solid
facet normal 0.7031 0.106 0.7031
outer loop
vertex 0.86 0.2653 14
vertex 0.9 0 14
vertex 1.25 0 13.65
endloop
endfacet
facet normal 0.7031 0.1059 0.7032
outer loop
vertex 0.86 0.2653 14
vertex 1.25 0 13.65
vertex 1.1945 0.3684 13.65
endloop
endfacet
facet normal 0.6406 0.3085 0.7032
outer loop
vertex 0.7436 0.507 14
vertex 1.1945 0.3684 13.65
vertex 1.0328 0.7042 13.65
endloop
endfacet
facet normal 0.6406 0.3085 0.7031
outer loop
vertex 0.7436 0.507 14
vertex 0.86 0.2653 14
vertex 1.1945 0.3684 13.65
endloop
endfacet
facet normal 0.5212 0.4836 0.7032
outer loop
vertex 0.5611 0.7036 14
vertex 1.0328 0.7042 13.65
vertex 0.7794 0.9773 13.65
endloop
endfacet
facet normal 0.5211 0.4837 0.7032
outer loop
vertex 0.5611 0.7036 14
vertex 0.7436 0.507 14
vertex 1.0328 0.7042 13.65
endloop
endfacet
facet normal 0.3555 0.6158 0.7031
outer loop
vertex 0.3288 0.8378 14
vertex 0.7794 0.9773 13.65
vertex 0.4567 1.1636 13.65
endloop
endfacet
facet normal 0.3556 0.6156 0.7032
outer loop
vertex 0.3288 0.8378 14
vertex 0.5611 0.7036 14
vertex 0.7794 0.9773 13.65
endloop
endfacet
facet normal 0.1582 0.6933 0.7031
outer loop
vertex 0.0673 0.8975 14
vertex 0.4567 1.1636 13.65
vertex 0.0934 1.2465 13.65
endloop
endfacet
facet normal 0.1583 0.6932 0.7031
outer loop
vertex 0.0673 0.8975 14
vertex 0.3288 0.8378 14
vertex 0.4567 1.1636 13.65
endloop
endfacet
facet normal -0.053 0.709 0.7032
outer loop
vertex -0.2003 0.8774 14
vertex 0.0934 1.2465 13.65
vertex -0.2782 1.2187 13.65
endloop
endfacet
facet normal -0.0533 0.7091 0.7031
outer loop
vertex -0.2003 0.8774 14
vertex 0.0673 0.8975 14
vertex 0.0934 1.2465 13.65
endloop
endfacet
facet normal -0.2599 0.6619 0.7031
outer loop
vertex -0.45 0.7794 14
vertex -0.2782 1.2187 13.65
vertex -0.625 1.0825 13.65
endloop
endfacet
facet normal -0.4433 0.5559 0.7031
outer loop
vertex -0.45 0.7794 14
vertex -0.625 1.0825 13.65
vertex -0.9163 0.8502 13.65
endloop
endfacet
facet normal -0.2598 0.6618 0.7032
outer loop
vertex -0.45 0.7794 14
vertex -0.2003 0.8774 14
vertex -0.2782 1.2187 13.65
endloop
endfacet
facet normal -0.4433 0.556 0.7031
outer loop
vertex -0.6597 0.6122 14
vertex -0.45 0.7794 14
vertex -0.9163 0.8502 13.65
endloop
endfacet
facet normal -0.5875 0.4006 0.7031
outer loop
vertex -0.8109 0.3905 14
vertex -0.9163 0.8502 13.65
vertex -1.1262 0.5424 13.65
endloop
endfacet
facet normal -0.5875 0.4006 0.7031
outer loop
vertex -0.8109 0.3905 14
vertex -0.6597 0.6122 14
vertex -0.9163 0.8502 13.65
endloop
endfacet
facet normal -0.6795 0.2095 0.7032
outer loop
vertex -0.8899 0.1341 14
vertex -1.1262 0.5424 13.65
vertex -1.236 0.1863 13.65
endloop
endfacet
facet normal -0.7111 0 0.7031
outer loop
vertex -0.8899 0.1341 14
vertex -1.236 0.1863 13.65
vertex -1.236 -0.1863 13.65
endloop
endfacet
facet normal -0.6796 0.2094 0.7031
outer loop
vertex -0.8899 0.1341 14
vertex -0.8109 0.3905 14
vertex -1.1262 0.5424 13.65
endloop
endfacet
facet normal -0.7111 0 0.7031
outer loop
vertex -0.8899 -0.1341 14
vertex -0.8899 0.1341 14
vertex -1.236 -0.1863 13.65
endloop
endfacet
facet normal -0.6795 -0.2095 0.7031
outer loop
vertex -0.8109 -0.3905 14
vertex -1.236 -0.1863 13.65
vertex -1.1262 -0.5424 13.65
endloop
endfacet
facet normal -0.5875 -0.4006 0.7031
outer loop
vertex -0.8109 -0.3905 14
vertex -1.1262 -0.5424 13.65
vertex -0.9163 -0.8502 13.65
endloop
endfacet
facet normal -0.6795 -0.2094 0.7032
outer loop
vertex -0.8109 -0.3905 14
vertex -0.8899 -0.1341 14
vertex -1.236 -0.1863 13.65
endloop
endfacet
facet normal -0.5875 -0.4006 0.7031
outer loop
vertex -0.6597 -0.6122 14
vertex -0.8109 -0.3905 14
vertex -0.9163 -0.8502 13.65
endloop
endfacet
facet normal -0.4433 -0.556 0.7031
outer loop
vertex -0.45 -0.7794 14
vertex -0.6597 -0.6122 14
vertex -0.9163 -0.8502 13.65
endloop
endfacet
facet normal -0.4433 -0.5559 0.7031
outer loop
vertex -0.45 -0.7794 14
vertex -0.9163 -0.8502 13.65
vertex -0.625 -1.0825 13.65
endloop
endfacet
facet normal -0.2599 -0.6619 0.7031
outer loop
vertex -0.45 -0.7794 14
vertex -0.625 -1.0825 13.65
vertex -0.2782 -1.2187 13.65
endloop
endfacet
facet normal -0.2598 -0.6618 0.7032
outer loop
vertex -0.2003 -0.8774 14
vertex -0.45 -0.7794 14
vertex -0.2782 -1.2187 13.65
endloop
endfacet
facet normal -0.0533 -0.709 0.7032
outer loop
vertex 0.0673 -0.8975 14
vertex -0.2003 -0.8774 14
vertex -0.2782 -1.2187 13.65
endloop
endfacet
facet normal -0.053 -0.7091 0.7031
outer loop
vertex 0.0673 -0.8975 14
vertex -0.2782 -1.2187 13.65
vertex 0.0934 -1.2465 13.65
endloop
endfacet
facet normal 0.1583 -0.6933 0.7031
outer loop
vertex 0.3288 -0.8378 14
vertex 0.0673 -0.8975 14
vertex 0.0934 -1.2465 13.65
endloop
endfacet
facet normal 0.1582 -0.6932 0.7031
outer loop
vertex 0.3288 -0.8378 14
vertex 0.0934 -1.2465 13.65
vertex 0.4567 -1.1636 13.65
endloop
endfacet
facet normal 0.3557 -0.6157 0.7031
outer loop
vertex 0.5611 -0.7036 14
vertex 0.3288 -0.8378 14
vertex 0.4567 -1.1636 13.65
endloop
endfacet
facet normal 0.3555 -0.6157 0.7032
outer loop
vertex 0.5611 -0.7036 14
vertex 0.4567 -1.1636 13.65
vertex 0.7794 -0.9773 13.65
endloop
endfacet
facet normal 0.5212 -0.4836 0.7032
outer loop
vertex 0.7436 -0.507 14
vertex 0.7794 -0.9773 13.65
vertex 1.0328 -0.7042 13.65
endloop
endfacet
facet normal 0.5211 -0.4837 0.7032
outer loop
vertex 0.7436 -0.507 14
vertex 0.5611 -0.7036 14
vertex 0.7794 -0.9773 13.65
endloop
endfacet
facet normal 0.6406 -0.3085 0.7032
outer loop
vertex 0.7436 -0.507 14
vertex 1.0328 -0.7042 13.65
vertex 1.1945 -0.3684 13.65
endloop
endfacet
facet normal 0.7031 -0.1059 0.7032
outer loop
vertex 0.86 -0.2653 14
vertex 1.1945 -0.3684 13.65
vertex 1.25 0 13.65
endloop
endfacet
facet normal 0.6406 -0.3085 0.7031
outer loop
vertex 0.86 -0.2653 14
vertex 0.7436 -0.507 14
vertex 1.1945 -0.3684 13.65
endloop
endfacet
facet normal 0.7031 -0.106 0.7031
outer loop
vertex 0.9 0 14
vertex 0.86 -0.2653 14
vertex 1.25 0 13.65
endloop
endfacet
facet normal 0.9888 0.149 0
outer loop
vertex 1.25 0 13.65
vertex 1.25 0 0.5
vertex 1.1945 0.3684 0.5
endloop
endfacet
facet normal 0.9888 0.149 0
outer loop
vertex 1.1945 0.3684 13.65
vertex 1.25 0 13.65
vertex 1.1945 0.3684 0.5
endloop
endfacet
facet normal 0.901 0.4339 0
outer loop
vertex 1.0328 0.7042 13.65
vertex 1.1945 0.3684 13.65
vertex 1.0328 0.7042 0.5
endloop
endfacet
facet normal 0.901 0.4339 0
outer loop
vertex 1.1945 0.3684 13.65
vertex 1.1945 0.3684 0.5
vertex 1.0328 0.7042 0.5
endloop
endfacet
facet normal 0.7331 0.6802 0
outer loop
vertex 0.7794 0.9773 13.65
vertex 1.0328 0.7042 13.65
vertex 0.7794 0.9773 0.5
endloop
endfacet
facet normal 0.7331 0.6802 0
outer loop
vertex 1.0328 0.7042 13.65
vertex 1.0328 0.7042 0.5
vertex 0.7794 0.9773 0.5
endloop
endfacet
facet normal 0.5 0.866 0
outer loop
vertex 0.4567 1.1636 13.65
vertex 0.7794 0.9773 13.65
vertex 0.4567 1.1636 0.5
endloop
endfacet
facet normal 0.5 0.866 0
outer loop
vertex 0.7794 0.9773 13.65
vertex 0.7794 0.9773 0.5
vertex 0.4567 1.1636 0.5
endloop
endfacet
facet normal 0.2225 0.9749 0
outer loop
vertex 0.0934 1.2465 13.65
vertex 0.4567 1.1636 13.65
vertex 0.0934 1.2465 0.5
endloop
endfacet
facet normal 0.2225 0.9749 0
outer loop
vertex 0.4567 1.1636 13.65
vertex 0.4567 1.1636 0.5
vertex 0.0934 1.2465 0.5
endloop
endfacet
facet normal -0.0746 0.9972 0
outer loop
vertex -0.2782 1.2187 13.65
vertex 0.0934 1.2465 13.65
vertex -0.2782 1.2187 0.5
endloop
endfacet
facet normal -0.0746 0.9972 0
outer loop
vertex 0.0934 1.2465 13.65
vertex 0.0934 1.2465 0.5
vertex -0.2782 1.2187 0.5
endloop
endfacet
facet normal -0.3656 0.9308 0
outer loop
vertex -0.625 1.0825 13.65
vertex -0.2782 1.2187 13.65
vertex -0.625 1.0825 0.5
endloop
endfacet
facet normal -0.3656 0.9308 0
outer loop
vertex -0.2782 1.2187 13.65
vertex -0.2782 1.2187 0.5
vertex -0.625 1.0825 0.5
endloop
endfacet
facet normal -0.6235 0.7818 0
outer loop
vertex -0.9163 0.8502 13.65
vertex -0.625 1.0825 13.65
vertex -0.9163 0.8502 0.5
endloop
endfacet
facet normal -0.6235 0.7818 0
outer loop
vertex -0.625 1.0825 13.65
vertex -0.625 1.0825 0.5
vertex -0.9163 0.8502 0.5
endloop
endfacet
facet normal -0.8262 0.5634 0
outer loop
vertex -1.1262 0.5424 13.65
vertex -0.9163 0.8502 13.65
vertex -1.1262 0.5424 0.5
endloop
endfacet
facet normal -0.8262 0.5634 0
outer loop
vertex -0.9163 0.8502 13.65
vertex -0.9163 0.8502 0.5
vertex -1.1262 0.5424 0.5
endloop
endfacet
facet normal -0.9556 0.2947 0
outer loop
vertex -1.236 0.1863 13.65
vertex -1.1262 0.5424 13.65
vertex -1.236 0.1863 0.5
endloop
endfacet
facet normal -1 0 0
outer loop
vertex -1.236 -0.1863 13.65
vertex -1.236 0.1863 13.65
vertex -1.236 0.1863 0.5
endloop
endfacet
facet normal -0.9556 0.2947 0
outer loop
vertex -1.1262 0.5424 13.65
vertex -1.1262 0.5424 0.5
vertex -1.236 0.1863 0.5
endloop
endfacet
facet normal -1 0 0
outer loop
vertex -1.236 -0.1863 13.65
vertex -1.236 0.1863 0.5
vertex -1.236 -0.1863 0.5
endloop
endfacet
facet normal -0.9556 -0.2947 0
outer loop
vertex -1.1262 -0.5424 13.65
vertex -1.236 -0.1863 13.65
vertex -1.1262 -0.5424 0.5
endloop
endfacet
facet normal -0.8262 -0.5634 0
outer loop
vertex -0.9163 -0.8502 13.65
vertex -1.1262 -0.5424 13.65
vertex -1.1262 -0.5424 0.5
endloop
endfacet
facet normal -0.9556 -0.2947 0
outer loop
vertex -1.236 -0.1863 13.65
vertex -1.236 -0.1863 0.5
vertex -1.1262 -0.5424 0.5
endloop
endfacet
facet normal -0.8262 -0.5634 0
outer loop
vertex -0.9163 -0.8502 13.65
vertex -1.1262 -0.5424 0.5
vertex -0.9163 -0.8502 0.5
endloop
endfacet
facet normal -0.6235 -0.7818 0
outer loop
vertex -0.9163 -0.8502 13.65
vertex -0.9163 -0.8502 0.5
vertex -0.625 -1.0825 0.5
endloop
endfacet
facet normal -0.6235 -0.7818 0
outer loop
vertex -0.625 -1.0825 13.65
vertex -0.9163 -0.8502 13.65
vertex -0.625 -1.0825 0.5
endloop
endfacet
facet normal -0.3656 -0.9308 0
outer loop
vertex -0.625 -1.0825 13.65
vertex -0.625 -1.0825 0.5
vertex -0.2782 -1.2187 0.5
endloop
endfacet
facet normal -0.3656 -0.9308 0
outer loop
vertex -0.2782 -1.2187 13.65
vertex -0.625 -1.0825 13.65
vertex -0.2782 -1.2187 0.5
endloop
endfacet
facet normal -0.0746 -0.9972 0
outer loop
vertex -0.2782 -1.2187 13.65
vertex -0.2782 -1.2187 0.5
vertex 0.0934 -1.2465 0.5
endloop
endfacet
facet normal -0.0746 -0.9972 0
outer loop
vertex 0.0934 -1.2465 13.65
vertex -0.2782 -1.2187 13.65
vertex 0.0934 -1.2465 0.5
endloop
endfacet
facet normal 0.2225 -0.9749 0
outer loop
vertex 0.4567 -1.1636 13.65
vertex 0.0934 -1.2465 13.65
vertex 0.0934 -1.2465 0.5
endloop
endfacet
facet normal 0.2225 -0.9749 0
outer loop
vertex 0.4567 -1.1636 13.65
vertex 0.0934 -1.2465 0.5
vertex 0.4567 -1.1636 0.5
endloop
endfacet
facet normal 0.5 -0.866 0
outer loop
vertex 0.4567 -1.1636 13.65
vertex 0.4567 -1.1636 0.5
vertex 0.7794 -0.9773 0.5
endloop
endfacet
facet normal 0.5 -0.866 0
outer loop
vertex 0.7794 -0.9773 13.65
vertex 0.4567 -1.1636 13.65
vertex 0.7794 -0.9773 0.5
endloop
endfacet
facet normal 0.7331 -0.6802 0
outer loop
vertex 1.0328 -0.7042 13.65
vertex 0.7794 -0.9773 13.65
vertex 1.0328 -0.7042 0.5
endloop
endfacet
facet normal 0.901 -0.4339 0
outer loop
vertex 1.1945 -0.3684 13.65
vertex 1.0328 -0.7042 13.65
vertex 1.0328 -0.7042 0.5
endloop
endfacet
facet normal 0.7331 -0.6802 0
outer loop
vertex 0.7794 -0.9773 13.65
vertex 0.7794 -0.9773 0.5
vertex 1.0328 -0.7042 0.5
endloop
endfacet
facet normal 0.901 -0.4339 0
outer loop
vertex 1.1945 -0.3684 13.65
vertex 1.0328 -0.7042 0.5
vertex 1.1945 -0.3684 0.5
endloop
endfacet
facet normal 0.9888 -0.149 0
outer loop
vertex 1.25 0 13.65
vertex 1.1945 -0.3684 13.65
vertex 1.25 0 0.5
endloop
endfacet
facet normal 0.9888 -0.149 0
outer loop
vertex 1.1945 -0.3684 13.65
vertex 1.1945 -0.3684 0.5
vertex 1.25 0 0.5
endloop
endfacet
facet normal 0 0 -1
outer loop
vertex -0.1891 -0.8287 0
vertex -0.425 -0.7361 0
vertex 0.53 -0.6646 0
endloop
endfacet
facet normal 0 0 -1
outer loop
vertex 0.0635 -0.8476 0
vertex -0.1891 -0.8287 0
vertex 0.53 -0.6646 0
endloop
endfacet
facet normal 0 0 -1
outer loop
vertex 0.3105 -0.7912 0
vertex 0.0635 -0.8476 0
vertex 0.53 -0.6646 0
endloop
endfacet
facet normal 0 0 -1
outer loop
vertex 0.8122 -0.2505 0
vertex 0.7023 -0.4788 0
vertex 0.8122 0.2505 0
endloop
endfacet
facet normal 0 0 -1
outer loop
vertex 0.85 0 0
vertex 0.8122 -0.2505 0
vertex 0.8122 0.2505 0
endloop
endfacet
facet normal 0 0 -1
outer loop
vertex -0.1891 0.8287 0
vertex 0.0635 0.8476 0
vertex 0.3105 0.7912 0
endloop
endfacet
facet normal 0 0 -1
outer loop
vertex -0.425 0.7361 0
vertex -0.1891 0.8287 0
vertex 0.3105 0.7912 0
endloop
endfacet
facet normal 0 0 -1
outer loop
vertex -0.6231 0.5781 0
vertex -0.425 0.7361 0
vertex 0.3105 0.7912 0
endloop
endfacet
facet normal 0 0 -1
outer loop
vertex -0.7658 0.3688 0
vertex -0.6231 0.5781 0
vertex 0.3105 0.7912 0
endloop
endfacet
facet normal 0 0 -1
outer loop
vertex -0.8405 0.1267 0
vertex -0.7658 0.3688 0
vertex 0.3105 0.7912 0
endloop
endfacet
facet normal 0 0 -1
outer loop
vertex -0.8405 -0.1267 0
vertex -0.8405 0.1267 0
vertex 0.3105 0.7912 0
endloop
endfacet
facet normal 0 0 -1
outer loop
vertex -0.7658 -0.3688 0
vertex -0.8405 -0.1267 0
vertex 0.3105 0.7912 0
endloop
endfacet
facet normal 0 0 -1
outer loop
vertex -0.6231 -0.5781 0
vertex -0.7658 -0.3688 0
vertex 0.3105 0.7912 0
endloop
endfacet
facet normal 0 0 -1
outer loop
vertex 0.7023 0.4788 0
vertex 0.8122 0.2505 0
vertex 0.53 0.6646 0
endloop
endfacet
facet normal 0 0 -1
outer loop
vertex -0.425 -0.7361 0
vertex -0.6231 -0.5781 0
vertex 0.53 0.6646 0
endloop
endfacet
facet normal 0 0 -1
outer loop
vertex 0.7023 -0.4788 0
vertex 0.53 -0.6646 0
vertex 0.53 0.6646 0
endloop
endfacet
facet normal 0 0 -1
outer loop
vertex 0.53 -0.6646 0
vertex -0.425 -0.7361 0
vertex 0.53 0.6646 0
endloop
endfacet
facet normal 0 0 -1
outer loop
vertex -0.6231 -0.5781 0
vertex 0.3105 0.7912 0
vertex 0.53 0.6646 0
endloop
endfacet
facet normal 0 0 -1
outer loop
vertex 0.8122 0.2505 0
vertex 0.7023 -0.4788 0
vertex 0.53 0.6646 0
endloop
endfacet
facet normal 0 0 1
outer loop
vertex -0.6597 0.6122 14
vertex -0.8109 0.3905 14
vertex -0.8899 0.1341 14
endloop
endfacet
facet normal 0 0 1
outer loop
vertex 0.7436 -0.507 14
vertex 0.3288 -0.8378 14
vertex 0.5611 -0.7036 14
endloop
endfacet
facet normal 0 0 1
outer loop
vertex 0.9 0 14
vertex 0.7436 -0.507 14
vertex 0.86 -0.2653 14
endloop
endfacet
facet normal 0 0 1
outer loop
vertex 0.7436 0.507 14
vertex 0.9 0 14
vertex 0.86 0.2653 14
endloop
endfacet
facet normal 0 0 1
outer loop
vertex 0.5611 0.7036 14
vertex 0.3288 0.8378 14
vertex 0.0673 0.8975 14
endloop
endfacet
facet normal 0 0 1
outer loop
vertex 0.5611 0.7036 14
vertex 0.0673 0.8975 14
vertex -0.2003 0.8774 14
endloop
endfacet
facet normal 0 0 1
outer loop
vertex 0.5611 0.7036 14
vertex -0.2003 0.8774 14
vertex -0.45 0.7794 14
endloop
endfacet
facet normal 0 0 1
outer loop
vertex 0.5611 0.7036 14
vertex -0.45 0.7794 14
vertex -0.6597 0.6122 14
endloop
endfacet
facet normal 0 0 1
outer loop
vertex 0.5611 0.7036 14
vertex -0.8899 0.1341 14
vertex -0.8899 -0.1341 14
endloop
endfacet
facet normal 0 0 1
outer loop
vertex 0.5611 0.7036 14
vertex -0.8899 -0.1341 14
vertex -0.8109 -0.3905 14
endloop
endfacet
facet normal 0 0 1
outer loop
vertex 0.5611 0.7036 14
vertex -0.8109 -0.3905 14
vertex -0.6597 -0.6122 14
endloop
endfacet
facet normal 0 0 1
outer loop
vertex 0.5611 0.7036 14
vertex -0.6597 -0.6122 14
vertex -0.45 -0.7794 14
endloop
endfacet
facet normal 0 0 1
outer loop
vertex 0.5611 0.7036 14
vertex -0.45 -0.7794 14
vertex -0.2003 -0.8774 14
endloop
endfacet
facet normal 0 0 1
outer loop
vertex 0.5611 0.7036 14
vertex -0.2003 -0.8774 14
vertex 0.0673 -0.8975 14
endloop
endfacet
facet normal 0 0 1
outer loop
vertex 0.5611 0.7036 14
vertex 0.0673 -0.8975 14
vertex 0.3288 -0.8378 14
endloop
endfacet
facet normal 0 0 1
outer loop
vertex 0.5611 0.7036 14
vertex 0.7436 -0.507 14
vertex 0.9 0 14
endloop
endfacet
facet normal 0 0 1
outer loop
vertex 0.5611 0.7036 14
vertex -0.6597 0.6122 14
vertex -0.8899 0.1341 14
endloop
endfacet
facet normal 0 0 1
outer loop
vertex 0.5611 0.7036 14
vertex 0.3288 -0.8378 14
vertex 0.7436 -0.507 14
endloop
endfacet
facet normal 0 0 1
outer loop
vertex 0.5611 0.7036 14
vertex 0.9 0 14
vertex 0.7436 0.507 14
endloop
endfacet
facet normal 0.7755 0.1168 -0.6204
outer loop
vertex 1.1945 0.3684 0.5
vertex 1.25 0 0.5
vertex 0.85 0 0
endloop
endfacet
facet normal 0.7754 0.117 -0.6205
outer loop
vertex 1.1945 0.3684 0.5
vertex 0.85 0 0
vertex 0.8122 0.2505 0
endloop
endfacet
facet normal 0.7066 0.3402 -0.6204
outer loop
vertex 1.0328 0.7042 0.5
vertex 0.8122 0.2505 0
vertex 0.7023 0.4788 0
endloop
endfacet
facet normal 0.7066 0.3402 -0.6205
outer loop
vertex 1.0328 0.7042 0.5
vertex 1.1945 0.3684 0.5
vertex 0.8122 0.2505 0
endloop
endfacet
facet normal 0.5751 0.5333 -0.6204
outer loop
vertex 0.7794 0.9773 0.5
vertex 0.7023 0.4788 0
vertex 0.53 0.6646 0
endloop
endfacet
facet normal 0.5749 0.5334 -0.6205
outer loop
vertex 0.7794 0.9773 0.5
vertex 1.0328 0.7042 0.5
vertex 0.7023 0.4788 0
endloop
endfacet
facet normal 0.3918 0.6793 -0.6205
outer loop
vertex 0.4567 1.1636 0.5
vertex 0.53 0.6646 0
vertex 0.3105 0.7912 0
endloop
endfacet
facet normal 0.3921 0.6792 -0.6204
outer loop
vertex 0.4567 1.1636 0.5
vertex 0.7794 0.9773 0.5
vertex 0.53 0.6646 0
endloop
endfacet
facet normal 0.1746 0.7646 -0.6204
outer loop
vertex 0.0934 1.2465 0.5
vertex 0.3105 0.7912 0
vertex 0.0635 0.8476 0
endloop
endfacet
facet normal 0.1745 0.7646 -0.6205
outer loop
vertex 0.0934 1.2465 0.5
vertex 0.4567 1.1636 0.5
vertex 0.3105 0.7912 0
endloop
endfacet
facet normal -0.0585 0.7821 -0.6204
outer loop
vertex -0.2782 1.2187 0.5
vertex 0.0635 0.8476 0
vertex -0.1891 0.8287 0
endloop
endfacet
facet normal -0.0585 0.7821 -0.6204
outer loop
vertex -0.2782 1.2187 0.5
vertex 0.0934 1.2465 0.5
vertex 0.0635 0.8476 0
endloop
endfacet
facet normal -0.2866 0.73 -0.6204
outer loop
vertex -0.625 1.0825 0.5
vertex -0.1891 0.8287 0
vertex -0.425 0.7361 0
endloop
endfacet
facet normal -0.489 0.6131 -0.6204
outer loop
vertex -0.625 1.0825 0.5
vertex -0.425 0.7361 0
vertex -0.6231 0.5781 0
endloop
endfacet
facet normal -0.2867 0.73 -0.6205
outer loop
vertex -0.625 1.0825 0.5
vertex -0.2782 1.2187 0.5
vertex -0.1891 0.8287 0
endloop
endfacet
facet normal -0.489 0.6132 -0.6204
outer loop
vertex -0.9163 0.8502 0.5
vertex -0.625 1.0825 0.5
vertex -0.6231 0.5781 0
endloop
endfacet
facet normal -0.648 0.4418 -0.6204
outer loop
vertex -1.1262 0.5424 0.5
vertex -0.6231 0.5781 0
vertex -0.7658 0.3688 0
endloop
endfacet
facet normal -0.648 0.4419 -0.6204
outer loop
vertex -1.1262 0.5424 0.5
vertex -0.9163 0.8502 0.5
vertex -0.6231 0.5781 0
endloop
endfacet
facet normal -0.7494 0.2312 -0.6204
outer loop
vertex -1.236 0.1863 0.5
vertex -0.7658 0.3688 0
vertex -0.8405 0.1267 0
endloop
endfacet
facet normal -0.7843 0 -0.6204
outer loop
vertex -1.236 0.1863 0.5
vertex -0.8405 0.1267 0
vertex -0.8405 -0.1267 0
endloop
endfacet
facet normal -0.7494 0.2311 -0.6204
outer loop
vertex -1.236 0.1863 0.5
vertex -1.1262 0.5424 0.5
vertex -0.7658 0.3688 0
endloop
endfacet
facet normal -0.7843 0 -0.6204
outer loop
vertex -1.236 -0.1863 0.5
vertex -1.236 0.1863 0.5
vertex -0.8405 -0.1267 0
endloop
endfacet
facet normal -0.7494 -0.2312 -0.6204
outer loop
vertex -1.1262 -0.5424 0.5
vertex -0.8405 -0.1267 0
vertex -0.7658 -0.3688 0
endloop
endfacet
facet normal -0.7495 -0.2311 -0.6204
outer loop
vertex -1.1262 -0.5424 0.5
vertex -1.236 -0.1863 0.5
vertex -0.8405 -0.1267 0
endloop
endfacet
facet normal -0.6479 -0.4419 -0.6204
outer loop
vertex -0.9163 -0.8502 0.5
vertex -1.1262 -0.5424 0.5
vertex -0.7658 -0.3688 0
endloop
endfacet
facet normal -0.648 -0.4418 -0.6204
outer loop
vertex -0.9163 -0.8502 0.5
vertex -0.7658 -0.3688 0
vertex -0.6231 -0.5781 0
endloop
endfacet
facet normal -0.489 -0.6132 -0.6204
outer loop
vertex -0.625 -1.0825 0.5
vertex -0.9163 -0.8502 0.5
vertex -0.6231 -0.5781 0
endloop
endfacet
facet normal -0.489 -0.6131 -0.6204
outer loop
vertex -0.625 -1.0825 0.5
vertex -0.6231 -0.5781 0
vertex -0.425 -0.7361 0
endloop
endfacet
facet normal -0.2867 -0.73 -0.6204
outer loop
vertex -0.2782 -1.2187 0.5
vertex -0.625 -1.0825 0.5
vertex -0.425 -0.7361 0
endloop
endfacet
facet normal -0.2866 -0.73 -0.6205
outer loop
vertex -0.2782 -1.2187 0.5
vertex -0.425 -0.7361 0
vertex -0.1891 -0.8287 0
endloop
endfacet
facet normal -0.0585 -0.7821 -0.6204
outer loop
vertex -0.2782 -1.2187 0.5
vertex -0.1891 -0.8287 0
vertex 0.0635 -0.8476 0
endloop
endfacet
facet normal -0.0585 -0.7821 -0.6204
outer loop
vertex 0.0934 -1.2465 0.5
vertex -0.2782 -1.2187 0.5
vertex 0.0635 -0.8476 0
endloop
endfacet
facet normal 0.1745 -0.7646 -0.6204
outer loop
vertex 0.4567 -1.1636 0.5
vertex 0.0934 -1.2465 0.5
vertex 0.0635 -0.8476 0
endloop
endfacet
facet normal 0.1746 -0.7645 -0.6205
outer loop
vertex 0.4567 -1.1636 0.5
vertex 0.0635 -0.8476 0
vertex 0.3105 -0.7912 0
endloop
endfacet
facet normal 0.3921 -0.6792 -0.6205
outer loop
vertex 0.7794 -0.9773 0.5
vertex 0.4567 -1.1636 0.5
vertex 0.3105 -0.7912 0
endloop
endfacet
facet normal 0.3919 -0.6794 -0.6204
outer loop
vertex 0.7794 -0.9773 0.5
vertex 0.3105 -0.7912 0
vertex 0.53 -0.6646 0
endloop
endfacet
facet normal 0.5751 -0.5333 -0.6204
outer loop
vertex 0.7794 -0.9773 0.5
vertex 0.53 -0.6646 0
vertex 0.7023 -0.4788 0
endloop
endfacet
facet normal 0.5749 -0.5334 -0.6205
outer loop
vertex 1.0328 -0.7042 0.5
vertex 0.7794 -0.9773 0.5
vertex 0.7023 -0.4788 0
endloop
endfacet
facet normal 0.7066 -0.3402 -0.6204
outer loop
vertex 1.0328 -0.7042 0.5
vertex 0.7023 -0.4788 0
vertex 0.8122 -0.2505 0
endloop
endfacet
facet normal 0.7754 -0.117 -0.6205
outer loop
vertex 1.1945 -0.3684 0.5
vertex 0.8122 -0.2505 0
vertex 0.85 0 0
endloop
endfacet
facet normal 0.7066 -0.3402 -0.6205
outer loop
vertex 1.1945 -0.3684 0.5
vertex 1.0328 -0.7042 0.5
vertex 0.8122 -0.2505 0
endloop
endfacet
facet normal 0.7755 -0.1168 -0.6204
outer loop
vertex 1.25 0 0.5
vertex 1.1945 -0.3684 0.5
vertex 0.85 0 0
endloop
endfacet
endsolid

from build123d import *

# Parameters (mm, degrees)
SKETCH1_R           = 1.25
BOSS_EXTRUDE1_DEPTH = 14
CHAMFER1_SIZE       = 0.35
CHAMFER2_SIZE       = 0.4
CHAMFER2_SIZE2      = 0.5


with BuildPart() as part:
    # Sketch1 → Boss-Extrude1 (new body)
    with BuildSketch(Plane.XY):
        Circle(SKETCH1_R)
    extrude(amount=BOSS_EXTRUDE1_DEPTH)

    # Chamfer1
    chamfer1_edges = [part.edges().sort_by_distance(p)[0] for p in [
        (-1.25, 0, 14),
    ]]
    chamfer(chamfer1_edges, length=CHAMFER1_SIZE)

    # Chamfer2
    chamfer2_edges = [part.edges().sort_by_distance(p)[0] for p in [
        (-1.25, 0, 0),
    ]]
    chamfer2_side = [part.faces().sort_by_distance(p)[0] for p in [
        (0, 0, 0),
    ]]
    chamfer(chamfer2_edges, length=CHAMFER2_SIZE, length2=CHAMFER2_SIZE2, reference=chamfer2_side[0])


solid = part.part
